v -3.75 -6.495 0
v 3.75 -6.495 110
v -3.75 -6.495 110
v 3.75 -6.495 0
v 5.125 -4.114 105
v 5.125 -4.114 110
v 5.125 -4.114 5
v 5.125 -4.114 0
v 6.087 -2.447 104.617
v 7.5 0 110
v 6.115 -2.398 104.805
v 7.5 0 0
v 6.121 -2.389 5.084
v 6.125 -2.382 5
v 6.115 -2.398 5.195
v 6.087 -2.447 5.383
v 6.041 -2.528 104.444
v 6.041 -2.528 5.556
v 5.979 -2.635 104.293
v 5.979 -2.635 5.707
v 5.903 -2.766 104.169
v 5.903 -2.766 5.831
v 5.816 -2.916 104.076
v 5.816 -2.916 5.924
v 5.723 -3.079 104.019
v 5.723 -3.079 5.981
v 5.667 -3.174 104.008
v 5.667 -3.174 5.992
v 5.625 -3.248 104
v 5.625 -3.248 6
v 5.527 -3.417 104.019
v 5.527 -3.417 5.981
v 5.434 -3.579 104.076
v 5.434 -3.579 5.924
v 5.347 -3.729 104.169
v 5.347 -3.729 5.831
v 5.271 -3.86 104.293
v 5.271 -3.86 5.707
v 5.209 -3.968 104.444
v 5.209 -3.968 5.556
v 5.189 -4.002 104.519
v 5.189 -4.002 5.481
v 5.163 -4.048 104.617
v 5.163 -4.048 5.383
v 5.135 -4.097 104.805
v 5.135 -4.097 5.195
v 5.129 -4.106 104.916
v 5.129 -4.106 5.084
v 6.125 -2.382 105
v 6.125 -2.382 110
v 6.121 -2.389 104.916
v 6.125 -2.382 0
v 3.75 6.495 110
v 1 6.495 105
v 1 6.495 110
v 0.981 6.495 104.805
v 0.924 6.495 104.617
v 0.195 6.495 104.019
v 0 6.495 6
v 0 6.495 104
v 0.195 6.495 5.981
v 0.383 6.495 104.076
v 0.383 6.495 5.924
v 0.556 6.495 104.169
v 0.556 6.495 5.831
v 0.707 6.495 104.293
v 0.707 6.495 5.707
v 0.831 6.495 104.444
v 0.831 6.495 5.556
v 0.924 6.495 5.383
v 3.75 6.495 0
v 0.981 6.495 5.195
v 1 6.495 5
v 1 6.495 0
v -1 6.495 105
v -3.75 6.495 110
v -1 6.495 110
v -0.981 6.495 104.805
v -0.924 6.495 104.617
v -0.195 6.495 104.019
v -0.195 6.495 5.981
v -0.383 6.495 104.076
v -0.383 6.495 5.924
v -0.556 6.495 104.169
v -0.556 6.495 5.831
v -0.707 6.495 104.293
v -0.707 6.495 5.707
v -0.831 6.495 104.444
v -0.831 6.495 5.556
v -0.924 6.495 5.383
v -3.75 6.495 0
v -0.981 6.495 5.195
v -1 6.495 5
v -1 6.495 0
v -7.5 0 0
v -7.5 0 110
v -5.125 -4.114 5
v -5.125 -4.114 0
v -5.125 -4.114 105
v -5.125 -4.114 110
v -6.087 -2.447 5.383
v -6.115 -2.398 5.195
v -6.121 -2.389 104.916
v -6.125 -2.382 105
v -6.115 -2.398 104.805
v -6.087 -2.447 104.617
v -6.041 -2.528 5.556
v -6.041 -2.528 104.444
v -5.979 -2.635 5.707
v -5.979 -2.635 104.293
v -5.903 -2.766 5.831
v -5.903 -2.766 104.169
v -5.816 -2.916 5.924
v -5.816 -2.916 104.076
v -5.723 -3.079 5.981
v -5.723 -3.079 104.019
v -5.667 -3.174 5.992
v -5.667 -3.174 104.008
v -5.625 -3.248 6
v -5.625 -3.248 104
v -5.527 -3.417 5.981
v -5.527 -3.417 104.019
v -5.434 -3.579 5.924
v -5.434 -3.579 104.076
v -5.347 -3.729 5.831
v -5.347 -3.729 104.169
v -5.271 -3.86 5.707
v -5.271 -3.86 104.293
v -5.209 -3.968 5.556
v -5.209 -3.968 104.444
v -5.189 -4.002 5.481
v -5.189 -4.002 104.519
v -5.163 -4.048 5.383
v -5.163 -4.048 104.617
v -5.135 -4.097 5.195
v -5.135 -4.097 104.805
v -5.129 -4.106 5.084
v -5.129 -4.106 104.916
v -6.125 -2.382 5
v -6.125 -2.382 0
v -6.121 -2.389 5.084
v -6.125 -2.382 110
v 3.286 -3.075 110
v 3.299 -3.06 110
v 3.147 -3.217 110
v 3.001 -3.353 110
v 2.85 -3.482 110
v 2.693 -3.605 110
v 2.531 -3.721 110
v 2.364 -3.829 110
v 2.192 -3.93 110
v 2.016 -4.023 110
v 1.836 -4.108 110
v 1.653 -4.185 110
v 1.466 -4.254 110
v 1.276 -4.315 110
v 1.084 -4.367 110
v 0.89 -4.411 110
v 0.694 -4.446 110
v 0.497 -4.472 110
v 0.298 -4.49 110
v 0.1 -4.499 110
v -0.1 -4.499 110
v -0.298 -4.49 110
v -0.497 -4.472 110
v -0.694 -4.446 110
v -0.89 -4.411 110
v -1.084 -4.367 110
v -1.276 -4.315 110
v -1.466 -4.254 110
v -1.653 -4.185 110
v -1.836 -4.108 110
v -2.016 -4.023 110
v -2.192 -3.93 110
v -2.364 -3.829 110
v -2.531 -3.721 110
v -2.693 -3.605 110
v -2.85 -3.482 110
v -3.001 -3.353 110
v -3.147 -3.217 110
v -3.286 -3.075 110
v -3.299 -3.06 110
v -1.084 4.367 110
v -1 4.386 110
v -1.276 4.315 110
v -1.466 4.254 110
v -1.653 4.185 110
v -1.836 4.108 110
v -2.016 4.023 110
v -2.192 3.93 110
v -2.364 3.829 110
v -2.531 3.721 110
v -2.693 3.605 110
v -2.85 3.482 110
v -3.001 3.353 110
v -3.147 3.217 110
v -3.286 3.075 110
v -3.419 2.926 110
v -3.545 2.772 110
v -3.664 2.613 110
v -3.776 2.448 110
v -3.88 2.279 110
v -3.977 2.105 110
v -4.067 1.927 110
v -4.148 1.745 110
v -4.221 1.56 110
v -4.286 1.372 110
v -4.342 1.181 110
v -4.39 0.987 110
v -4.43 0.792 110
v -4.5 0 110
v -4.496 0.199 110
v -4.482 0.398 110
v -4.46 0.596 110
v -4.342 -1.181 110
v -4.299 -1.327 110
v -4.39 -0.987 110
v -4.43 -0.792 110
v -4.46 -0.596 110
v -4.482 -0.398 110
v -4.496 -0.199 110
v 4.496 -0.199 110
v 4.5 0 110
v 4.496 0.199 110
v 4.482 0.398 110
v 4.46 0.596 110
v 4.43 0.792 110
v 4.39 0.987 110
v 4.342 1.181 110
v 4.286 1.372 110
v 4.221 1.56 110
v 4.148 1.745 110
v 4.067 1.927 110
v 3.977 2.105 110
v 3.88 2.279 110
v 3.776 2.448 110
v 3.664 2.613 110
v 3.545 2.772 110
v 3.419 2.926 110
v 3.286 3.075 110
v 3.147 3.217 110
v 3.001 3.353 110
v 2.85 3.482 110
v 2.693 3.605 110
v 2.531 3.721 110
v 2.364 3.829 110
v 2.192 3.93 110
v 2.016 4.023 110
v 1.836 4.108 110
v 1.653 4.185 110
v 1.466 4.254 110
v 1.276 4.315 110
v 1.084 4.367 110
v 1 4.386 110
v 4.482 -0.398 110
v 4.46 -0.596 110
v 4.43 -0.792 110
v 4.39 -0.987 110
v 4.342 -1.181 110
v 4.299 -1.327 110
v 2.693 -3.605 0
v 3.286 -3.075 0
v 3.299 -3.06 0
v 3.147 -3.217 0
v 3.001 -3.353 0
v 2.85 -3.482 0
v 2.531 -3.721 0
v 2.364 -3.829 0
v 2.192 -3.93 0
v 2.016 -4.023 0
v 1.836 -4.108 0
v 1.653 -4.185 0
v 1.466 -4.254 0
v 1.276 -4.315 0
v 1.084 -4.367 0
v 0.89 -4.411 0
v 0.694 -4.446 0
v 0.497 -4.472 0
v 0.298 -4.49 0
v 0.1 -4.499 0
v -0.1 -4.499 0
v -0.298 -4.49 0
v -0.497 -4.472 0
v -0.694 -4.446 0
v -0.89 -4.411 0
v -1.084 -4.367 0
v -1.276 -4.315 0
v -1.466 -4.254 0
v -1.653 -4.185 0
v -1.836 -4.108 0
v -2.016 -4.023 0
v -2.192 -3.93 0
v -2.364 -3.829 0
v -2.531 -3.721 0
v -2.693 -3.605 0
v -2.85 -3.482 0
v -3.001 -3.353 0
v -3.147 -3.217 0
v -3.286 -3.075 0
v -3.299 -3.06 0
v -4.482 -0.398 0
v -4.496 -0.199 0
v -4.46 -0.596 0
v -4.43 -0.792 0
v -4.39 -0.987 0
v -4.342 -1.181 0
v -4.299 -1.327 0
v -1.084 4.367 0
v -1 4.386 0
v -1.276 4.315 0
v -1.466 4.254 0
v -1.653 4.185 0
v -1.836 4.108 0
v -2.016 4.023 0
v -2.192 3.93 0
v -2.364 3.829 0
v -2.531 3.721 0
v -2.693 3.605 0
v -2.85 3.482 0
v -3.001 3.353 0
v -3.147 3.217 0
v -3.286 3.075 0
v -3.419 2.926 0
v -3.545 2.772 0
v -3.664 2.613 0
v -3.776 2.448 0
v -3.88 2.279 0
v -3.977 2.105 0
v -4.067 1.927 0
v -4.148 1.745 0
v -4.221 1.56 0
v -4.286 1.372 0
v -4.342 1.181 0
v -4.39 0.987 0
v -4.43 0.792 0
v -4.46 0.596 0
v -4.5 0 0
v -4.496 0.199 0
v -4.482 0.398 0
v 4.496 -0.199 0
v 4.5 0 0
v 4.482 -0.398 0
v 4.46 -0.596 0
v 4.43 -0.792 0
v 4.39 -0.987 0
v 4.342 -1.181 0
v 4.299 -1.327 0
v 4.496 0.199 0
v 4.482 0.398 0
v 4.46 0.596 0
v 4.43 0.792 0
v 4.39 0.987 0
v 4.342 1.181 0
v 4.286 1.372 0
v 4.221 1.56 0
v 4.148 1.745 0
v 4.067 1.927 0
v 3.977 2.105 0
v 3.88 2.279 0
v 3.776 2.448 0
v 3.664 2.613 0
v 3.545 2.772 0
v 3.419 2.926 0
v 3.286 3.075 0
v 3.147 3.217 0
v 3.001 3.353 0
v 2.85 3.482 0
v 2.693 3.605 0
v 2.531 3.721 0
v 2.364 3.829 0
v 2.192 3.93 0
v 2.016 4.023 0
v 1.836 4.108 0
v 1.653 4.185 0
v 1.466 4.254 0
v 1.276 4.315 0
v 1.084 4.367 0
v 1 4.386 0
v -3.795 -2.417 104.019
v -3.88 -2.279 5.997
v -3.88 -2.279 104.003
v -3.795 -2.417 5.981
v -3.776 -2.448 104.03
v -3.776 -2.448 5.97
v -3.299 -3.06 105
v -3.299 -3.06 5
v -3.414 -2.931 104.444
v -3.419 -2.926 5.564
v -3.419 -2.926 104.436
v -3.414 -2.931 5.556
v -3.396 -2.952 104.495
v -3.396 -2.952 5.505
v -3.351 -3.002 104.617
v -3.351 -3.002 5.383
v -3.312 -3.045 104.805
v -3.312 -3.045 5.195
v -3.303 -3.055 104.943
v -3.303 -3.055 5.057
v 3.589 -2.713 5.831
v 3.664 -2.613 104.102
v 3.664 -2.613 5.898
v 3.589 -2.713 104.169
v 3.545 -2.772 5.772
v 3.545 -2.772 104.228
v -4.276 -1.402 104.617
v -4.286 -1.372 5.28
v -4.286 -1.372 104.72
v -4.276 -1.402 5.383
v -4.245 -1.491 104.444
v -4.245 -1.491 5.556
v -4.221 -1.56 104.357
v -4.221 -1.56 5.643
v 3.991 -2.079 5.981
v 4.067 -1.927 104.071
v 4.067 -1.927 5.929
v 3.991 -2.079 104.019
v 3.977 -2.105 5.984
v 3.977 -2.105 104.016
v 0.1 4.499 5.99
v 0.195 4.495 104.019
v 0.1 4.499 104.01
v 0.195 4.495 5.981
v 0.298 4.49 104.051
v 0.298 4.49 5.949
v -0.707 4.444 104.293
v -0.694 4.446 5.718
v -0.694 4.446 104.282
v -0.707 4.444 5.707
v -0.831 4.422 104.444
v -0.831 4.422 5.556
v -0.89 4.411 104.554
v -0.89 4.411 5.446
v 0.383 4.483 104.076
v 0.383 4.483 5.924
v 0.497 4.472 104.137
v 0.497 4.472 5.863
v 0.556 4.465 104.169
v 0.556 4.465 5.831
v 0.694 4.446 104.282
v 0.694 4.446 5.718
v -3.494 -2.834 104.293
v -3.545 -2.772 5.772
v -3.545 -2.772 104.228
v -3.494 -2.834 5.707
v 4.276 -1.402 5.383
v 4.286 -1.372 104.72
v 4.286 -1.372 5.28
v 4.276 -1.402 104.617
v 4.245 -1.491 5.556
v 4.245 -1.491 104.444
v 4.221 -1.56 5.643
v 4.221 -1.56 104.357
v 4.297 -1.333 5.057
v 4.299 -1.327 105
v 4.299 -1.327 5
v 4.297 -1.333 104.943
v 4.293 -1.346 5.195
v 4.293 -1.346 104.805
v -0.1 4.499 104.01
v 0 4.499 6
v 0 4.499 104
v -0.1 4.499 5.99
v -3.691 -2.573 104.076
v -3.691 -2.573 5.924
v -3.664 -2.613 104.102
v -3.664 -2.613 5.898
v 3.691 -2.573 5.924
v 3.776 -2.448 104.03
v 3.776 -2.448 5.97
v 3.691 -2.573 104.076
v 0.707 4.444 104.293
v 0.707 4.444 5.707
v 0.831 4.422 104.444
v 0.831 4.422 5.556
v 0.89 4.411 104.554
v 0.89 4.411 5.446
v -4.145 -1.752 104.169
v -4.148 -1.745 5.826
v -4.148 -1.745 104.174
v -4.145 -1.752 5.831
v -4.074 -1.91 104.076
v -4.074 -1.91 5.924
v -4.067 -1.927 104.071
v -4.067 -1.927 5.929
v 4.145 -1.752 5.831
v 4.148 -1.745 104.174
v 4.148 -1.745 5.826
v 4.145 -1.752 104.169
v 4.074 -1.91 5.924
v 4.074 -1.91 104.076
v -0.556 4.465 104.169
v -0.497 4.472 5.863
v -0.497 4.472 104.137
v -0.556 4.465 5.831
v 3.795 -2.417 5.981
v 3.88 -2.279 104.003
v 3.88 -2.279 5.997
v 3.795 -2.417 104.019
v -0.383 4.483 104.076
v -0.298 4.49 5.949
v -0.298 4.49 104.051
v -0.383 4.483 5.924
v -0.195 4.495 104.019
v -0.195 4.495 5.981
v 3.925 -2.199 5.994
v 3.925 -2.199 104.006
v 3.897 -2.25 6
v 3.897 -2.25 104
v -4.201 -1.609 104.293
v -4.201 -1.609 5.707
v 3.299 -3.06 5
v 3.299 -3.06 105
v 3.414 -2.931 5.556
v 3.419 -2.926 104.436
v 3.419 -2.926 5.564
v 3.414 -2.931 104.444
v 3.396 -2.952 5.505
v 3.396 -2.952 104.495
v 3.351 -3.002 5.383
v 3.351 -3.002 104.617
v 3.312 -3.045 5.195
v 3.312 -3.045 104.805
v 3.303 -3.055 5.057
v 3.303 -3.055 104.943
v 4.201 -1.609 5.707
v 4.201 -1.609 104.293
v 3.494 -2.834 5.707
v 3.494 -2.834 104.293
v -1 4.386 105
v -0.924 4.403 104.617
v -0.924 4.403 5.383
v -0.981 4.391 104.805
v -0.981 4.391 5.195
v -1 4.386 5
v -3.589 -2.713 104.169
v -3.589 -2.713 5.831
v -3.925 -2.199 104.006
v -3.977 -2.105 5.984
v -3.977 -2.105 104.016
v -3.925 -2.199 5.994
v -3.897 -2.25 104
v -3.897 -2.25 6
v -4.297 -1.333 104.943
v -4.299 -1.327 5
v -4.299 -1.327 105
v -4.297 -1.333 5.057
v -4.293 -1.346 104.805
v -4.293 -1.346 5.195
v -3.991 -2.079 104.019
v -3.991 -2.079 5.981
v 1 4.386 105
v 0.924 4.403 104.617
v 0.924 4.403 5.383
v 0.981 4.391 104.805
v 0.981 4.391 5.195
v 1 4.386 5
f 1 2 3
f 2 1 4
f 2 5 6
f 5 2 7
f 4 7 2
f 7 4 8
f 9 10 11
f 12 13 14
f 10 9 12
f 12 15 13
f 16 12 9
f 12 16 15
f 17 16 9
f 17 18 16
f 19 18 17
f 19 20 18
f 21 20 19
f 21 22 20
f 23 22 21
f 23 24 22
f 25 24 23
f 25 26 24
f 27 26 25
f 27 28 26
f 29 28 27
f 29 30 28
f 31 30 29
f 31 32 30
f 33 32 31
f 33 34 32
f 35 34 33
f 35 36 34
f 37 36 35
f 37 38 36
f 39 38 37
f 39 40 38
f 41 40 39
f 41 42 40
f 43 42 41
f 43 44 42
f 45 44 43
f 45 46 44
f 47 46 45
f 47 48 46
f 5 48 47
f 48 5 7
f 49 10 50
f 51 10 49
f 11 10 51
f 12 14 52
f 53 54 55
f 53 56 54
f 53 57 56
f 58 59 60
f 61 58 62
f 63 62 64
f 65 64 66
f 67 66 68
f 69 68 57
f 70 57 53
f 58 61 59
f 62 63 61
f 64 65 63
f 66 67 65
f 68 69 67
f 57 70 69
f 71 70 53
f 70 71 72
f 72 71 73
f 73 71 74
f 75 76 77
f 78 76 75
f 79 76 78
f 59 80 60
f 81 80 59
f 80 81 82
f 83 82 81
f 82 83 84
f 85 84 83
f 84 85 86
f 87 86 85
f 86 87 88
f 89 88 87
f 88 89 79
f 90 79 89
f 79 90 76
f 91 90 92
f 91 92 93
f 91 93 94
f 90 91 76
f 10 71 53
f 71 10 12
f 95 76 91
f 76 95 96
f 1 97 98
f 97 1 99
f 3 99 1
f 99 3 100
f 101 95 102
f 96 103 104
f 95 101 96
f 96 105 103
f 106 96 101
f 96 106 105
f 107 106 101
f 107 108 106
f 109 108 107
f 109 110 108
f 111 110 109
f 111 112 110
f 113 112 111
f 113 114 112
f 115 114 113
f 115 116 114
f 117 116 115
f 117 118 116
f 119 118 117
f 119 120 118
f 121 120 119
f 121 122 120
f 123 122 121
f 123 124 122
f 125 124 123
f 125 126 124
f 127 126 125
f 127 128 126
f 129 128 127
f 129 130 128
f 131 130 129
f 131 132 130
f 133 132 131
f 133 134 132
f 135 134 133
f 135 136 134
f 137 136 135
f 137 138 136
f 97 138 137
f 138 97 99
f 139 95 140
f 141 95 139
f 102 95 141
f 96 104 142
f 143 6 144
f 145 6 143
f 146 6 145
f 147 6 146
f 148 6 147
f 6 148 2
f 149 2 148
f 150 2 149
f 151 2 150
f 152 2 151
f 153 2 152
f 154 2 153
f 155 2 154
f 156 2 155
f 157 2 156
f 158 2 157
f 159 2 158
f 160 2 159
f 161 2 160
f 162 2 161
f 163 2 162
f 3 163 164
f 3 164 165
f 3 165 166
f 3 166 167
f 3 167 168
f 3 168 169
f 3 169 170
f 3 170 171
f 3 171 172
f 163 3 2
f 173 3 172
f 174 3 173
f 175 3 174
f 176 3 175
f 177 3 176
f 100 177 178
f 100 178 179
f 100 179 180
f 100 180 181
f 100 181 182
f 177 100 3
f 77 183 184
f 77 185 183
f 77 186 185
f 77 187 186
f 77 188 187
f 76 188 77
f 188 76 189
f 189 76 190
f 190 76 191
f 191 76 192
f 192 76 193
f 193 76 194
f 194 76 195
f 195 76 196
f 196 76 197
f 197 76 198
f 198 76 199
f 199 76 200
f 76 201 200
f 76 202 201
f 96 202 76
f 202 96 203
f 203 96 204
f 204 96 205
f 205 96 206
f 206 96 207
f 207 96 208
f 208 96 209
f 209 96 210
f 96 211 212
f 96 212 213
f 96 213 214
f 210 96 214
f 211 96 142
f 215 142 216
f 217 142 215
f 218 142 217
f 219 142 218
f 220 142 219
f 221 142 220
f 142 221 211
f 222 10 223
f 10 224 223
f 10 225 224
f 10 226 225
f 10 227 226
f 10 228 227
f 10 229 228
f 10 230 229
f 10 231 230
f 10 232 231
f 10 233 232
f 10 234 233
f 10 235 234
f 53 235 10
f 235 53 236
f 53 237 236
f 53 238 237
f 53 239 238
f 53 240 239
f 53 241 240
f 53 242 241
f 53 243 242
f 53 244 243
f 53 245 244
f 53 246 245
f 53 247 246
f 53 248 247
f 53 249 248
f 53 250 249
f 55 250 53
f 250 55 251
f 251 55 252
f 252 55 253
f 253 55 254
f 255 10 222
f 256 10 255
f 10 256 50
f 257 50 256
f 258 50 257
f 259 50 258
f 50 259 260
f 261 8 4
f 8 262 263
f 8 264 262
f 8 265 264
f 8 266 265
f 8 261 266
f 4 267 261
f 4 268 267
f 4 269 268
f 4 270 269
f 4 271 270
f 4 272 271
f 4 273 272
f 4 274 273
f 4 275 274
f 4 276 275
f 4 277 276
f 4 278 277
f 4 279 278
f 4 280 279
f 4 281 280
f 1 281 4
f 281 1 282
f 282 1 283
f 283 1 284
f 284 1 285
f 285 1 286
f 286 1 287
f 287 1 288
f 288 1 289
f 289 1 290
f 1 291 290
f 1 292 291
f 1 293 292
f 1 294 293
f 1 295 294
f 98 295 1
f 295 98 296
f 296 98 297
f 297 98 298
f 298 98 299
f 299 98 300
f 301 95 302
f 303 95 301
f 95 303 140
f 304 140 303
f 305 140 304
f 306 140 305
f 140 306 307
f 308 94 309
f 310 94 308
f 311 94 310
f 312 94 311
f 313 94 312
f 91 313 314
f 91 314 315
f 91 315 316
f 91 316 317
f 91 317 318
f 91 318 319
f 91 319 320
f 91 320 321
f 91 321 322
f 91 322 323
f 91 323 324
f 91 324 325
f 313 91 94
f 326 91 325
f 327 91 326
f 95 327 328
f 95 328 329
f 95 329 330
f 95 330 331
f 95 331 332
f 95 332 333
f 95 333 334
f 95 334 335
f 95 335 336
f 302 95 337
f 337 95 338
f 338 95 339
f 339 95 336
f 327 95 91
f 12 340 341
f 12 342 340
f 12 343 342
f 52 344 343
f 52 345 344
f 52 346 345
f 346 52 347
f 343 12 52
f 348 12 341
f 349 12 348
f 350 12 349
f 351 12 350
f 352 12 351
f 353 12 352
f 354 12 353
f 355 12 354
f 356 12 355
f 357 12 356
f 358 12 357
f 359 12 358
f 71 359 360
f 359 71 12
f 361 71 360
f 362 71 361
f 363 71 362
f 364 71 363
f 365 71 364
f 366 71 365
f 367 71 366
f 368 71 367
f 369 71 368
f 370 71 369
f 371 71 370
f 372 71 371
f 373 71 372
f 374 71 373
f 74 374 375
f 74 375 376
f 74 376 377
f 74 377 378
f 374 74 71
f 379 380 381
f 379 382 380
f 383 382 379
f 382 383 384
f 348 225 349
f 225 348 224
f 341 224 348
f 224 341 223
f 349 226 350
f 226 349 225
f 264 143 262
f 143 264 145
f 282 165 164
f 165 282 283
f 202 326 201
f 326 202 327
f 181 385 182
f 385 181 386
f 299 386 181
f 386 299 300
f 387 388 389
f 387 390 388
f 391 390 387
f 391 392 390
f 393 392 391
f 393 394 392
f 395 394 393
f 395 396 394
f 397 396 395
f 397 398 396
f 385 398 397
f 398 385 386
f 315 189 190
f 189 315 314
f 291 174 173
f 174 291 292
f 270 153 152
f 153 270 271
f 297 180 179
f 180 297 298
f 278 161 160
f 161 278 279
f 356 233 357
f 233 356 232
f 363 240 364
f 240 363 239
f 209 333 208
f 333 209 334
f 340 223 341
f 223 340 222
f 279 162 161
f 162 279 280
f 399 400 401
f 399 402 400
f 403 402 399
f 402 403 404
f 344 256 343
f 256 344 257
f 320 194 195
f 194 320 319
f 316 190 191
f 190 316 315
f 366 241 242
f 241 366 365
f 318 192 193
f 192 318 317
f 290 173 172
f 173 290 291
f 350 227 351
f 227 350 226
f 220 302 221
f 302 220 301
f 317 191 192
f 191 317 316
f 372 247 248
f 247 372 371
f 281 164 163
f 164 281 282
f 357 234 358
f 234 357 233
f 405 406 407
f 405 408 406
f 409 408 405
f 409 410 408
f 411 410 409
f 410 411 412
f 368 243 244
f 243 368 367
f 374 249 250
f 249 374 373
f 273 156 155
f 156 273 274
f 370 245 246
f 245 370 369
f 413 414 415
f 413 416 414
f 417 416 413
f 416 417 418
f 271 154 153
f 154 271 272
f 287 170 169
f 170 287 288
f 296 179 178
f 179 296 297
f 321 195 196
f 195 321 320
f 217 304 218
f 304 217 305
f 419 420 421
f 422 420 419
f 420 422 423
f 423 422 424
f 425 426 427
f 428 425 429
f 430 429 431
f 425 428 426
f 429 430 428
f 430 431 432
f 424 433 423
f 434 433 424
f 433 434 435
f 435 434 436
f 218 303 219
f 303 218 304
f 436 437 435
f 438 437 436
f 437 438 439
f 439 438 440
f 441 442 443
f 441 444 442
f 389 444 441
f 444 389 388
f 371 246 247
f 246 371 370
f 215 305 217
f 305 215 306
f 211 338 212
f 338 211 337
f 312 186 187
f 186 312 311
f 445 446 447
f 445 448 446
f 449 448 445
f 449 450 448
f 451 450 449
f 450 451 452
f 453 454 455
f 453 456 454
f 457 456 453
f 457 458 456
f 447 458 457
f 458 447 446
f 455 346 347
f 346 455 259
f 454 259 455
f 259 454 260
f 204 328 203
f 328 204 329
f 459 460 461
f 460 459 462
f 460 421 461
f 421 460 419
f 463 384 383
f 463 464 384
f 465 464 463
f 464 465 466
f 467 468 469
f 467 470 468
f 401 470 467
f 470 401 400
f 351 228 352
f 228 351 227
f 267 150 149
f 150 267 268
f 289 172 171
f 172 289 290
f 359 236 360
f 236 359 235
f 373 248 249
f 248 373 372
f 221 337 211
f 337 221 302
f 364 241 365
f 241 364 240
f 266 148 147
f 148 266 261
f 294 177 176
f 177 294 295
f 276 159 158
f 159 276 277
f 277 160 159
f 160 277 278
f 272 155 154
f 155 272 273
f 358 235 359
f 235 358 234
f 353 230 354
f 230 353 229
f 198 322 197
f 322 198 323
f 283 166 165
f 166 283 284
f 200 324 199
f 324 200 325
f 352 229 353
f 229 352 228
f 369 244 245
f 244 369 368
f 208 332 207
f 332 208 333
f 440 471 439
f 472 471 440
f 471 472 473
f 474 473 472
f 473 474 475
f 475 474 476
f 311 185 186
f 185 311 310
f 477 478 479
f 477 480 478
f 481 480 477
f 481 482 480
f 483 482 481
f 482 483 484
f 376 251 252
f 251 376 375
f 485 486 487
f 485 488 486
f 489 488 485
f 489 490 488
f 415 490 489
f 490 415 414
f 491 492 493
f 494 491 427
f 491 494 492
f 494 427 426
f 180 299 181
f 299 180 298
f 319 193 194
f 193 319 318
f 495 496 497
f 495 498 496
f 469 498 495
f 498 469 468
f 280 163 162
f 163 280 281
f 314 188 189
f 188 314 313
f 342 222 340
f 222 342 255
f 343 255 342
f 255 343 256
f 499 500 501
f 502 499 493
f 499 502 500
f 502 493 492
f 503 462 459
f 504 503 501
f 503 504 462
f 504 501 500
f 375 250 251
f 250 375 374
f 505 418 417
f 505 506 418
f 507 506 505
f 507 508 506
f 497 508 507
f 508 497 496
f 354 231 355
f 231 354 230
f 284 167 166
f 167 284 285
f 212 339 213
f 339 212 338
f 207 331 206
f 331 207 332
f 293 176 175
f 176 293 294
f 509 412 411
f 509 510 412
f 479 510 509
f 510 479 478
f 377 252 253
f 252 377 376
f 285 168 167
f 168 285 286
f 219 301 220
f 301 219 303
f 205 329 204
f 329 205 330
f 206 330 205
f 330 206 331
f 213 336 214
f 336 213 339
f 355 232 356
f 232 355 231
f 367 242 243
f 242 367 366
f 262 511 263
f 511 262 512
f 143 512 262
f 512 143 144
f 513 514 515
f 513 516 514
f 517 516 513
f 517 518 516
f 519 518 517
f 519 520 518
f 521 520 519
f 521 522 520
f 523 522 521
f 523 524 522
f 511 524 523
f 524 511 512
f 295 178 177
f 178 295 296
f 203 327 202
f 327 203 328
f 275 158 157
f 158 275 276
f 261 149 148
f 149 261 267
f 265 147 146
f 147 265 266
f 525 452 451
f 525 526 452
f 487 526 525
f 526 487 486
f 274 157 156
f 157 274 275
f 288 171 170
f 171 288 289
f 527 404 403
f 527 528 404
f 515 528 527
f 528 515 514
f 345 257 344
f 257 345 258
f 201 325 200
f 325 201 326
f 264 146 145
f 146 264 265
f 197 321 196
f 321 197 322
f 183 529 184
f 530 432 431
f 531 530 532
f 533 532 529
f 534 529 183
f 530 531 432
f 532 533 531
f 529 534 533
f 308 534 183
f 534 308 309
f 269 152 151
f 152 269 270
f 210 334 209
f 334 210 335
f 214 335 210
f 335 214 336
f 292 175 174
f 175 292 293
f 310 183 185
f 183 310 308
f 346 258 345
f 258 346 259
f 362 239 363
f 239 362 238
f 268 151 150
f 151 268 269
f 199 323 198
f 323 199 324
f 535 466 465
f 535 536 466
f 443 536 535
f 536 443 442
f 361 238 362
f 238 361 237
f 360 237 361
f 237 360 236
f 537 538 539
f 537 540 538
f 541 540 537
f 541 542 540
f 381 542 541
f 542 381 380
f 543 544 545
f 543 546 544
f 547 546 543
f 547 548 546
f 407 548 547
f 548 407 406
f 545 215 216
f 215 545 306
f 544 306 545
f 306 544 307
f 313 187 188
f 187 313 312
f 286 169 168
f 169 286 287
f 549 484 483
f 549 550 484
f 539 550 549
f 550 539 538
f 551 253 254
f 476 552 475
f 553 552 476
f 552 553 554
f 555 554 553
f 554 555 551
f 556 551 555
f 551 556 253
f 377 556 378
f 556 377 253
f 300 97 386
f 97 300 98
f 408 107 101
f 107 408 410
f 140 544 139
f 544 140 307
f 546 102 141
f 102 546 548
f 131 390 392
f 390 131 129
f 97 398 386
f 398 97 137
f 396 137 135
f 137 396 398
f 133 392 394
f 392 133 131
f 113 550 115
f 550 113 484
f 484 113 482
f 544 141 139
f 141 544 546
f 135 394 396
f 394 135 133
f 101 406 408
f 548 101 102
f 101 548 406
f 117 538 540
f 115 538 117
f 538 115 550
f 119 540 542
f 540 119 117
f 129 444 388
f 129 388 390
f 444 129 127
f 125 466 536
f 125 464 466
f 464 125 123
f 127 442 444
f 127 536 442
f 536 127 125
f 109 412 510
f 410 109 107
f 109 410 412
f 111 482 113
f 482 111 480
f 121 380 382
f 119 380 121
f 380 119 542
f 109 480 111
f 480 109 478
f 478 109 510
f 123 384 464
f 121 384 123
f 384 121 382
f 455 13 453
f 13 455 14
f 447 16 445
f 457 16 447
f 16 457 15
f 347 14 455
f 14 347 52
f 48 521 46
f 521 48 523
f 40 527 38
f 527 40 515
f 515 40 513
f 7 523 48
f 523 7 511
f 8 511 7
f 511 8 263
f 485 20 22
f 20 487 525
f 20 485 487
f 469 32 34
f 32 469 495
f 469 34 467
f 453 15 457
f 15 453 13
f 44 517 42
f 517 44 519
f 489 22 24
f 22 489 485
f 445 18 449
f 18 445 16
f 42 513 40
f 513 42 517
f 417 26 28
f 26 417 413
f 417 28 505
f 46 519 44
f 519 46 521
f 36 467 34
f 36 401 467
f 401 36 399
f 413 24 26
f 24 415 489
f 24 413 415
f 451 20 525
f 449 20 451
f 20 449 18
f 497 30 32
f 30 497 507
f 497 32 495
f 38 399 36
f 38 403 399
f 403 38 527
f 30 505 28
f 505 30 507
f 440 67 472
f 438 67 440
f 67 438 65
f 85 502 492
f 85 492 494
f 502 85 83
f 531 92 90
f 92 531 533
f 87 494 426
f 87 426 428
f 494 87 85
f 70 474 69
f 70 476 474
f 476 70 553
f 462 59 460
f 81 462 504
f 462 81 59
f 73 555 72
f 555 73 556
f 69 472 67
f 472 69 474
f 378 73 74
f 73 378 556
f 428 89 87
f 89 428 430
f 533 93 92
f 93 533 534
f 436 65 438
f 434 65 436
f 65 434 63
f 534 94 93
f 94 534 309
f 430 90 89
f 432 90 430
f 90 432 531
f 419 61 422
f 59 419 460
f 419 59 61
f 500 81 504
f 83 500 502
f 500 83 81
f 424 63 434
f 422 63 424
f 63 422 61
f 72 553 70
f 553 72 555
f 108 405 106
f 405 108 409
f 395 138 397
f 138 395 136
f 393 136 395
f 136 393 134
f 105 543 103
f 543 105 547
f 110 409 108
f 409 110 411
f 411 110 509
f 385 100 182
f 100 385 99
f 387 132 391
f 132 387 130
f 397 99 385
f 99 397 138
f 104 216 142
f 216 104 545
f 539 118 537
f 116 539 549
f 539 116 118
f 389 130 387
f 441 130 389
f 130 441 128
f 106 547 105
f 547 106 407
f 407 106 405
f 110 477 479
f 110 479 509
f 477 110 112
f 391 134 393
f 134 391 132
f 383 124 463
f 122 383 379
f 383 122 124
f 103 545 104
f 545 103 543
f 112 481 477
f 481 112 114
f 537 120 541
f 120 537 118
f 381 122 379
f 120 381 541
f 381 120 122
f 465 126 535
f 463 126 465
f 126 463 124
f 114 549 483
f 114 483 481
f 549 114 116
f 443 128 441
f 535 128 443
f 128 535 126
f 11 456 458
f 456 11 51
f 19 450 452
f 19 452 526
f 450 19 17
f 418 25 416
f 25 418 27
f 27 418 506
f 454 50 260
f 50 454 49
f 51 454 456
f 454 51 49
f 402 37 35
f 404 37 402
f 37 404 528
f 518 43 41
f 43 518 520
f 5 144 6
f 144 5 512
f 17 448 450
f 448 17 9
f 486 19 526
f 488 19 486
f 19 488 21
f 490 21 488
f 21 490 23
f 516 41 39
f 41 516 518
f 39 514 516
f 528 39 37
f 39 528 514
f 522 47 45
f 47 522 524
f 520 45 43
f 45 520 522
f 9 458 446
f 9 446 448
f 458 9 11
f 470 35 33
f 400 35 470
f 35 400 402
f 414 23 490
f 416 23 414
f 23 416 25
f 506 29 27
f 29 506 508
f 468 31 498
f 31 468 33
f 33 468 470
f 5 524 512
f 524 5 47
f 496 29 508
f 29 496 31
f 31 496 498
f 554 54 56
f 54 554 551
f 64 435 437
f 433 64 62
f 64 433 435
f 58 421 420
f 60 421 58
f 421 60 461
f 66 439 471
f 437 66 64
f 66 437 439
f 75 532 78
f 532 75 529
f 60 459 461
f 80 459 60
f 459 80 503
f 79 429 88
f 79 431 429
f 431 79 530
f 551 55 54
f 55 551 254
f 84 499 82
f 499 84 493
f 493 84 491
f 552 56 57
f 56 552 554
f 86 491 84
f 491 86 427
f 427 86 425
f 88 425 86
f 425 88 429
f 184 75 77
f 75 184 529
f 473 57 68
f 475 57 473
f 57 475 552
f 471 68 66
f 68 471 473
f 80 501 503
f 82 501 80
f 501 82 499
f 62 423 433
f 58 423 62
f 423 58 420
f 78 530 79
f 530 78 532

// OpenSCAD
$fs=0.2;
$fa=1;
strut_base_length=100;
slot_length=5;
diameter=15;
wall_thickness=3;
slot_width=2;
slot_count=3;
cap_length=2;
cap_plug_length=1.8;
cap_clearance=0.05;

module slot_cutter_cylinder() {
    rotate([-90, 0, 0]) cylinder(h=diameter, d=slot_width);
}

module slot_cutter_fin() {
    hull() {
        slot_cutter_cylinder();
        translate([0, 0, slot_length]) slot_cutter_cylinder();
    }
}

module slot_cutter() {
    for(angle=[360/slot_count:360/slot_count:360]) {
        rotate([0, 0, angle]) slot_cutter_fin();
    }
}

module hex_shell() {
    difference() {
        cylinder(h=strut_base_length+slot_length*2, d=diameter, $fn=6);
        cylinder(h=strut_base_length+slot_length*2, d=diameter-wall_thickness*2);
    }
}

module strut() {
    difference() {
        hex_shell();
        slot_cutter();
        translate([0, 0, strut_base_length+slot_length]) slot_cutter();
    }
}

module cap() {
    cylinder(h=cap_length, d=diameter, $fn=6);
    cylinder(h=cap_length+cap_plug_length, d=diameter-wall_thickness*2-cap_clearance);
}

strut();
//cap();
